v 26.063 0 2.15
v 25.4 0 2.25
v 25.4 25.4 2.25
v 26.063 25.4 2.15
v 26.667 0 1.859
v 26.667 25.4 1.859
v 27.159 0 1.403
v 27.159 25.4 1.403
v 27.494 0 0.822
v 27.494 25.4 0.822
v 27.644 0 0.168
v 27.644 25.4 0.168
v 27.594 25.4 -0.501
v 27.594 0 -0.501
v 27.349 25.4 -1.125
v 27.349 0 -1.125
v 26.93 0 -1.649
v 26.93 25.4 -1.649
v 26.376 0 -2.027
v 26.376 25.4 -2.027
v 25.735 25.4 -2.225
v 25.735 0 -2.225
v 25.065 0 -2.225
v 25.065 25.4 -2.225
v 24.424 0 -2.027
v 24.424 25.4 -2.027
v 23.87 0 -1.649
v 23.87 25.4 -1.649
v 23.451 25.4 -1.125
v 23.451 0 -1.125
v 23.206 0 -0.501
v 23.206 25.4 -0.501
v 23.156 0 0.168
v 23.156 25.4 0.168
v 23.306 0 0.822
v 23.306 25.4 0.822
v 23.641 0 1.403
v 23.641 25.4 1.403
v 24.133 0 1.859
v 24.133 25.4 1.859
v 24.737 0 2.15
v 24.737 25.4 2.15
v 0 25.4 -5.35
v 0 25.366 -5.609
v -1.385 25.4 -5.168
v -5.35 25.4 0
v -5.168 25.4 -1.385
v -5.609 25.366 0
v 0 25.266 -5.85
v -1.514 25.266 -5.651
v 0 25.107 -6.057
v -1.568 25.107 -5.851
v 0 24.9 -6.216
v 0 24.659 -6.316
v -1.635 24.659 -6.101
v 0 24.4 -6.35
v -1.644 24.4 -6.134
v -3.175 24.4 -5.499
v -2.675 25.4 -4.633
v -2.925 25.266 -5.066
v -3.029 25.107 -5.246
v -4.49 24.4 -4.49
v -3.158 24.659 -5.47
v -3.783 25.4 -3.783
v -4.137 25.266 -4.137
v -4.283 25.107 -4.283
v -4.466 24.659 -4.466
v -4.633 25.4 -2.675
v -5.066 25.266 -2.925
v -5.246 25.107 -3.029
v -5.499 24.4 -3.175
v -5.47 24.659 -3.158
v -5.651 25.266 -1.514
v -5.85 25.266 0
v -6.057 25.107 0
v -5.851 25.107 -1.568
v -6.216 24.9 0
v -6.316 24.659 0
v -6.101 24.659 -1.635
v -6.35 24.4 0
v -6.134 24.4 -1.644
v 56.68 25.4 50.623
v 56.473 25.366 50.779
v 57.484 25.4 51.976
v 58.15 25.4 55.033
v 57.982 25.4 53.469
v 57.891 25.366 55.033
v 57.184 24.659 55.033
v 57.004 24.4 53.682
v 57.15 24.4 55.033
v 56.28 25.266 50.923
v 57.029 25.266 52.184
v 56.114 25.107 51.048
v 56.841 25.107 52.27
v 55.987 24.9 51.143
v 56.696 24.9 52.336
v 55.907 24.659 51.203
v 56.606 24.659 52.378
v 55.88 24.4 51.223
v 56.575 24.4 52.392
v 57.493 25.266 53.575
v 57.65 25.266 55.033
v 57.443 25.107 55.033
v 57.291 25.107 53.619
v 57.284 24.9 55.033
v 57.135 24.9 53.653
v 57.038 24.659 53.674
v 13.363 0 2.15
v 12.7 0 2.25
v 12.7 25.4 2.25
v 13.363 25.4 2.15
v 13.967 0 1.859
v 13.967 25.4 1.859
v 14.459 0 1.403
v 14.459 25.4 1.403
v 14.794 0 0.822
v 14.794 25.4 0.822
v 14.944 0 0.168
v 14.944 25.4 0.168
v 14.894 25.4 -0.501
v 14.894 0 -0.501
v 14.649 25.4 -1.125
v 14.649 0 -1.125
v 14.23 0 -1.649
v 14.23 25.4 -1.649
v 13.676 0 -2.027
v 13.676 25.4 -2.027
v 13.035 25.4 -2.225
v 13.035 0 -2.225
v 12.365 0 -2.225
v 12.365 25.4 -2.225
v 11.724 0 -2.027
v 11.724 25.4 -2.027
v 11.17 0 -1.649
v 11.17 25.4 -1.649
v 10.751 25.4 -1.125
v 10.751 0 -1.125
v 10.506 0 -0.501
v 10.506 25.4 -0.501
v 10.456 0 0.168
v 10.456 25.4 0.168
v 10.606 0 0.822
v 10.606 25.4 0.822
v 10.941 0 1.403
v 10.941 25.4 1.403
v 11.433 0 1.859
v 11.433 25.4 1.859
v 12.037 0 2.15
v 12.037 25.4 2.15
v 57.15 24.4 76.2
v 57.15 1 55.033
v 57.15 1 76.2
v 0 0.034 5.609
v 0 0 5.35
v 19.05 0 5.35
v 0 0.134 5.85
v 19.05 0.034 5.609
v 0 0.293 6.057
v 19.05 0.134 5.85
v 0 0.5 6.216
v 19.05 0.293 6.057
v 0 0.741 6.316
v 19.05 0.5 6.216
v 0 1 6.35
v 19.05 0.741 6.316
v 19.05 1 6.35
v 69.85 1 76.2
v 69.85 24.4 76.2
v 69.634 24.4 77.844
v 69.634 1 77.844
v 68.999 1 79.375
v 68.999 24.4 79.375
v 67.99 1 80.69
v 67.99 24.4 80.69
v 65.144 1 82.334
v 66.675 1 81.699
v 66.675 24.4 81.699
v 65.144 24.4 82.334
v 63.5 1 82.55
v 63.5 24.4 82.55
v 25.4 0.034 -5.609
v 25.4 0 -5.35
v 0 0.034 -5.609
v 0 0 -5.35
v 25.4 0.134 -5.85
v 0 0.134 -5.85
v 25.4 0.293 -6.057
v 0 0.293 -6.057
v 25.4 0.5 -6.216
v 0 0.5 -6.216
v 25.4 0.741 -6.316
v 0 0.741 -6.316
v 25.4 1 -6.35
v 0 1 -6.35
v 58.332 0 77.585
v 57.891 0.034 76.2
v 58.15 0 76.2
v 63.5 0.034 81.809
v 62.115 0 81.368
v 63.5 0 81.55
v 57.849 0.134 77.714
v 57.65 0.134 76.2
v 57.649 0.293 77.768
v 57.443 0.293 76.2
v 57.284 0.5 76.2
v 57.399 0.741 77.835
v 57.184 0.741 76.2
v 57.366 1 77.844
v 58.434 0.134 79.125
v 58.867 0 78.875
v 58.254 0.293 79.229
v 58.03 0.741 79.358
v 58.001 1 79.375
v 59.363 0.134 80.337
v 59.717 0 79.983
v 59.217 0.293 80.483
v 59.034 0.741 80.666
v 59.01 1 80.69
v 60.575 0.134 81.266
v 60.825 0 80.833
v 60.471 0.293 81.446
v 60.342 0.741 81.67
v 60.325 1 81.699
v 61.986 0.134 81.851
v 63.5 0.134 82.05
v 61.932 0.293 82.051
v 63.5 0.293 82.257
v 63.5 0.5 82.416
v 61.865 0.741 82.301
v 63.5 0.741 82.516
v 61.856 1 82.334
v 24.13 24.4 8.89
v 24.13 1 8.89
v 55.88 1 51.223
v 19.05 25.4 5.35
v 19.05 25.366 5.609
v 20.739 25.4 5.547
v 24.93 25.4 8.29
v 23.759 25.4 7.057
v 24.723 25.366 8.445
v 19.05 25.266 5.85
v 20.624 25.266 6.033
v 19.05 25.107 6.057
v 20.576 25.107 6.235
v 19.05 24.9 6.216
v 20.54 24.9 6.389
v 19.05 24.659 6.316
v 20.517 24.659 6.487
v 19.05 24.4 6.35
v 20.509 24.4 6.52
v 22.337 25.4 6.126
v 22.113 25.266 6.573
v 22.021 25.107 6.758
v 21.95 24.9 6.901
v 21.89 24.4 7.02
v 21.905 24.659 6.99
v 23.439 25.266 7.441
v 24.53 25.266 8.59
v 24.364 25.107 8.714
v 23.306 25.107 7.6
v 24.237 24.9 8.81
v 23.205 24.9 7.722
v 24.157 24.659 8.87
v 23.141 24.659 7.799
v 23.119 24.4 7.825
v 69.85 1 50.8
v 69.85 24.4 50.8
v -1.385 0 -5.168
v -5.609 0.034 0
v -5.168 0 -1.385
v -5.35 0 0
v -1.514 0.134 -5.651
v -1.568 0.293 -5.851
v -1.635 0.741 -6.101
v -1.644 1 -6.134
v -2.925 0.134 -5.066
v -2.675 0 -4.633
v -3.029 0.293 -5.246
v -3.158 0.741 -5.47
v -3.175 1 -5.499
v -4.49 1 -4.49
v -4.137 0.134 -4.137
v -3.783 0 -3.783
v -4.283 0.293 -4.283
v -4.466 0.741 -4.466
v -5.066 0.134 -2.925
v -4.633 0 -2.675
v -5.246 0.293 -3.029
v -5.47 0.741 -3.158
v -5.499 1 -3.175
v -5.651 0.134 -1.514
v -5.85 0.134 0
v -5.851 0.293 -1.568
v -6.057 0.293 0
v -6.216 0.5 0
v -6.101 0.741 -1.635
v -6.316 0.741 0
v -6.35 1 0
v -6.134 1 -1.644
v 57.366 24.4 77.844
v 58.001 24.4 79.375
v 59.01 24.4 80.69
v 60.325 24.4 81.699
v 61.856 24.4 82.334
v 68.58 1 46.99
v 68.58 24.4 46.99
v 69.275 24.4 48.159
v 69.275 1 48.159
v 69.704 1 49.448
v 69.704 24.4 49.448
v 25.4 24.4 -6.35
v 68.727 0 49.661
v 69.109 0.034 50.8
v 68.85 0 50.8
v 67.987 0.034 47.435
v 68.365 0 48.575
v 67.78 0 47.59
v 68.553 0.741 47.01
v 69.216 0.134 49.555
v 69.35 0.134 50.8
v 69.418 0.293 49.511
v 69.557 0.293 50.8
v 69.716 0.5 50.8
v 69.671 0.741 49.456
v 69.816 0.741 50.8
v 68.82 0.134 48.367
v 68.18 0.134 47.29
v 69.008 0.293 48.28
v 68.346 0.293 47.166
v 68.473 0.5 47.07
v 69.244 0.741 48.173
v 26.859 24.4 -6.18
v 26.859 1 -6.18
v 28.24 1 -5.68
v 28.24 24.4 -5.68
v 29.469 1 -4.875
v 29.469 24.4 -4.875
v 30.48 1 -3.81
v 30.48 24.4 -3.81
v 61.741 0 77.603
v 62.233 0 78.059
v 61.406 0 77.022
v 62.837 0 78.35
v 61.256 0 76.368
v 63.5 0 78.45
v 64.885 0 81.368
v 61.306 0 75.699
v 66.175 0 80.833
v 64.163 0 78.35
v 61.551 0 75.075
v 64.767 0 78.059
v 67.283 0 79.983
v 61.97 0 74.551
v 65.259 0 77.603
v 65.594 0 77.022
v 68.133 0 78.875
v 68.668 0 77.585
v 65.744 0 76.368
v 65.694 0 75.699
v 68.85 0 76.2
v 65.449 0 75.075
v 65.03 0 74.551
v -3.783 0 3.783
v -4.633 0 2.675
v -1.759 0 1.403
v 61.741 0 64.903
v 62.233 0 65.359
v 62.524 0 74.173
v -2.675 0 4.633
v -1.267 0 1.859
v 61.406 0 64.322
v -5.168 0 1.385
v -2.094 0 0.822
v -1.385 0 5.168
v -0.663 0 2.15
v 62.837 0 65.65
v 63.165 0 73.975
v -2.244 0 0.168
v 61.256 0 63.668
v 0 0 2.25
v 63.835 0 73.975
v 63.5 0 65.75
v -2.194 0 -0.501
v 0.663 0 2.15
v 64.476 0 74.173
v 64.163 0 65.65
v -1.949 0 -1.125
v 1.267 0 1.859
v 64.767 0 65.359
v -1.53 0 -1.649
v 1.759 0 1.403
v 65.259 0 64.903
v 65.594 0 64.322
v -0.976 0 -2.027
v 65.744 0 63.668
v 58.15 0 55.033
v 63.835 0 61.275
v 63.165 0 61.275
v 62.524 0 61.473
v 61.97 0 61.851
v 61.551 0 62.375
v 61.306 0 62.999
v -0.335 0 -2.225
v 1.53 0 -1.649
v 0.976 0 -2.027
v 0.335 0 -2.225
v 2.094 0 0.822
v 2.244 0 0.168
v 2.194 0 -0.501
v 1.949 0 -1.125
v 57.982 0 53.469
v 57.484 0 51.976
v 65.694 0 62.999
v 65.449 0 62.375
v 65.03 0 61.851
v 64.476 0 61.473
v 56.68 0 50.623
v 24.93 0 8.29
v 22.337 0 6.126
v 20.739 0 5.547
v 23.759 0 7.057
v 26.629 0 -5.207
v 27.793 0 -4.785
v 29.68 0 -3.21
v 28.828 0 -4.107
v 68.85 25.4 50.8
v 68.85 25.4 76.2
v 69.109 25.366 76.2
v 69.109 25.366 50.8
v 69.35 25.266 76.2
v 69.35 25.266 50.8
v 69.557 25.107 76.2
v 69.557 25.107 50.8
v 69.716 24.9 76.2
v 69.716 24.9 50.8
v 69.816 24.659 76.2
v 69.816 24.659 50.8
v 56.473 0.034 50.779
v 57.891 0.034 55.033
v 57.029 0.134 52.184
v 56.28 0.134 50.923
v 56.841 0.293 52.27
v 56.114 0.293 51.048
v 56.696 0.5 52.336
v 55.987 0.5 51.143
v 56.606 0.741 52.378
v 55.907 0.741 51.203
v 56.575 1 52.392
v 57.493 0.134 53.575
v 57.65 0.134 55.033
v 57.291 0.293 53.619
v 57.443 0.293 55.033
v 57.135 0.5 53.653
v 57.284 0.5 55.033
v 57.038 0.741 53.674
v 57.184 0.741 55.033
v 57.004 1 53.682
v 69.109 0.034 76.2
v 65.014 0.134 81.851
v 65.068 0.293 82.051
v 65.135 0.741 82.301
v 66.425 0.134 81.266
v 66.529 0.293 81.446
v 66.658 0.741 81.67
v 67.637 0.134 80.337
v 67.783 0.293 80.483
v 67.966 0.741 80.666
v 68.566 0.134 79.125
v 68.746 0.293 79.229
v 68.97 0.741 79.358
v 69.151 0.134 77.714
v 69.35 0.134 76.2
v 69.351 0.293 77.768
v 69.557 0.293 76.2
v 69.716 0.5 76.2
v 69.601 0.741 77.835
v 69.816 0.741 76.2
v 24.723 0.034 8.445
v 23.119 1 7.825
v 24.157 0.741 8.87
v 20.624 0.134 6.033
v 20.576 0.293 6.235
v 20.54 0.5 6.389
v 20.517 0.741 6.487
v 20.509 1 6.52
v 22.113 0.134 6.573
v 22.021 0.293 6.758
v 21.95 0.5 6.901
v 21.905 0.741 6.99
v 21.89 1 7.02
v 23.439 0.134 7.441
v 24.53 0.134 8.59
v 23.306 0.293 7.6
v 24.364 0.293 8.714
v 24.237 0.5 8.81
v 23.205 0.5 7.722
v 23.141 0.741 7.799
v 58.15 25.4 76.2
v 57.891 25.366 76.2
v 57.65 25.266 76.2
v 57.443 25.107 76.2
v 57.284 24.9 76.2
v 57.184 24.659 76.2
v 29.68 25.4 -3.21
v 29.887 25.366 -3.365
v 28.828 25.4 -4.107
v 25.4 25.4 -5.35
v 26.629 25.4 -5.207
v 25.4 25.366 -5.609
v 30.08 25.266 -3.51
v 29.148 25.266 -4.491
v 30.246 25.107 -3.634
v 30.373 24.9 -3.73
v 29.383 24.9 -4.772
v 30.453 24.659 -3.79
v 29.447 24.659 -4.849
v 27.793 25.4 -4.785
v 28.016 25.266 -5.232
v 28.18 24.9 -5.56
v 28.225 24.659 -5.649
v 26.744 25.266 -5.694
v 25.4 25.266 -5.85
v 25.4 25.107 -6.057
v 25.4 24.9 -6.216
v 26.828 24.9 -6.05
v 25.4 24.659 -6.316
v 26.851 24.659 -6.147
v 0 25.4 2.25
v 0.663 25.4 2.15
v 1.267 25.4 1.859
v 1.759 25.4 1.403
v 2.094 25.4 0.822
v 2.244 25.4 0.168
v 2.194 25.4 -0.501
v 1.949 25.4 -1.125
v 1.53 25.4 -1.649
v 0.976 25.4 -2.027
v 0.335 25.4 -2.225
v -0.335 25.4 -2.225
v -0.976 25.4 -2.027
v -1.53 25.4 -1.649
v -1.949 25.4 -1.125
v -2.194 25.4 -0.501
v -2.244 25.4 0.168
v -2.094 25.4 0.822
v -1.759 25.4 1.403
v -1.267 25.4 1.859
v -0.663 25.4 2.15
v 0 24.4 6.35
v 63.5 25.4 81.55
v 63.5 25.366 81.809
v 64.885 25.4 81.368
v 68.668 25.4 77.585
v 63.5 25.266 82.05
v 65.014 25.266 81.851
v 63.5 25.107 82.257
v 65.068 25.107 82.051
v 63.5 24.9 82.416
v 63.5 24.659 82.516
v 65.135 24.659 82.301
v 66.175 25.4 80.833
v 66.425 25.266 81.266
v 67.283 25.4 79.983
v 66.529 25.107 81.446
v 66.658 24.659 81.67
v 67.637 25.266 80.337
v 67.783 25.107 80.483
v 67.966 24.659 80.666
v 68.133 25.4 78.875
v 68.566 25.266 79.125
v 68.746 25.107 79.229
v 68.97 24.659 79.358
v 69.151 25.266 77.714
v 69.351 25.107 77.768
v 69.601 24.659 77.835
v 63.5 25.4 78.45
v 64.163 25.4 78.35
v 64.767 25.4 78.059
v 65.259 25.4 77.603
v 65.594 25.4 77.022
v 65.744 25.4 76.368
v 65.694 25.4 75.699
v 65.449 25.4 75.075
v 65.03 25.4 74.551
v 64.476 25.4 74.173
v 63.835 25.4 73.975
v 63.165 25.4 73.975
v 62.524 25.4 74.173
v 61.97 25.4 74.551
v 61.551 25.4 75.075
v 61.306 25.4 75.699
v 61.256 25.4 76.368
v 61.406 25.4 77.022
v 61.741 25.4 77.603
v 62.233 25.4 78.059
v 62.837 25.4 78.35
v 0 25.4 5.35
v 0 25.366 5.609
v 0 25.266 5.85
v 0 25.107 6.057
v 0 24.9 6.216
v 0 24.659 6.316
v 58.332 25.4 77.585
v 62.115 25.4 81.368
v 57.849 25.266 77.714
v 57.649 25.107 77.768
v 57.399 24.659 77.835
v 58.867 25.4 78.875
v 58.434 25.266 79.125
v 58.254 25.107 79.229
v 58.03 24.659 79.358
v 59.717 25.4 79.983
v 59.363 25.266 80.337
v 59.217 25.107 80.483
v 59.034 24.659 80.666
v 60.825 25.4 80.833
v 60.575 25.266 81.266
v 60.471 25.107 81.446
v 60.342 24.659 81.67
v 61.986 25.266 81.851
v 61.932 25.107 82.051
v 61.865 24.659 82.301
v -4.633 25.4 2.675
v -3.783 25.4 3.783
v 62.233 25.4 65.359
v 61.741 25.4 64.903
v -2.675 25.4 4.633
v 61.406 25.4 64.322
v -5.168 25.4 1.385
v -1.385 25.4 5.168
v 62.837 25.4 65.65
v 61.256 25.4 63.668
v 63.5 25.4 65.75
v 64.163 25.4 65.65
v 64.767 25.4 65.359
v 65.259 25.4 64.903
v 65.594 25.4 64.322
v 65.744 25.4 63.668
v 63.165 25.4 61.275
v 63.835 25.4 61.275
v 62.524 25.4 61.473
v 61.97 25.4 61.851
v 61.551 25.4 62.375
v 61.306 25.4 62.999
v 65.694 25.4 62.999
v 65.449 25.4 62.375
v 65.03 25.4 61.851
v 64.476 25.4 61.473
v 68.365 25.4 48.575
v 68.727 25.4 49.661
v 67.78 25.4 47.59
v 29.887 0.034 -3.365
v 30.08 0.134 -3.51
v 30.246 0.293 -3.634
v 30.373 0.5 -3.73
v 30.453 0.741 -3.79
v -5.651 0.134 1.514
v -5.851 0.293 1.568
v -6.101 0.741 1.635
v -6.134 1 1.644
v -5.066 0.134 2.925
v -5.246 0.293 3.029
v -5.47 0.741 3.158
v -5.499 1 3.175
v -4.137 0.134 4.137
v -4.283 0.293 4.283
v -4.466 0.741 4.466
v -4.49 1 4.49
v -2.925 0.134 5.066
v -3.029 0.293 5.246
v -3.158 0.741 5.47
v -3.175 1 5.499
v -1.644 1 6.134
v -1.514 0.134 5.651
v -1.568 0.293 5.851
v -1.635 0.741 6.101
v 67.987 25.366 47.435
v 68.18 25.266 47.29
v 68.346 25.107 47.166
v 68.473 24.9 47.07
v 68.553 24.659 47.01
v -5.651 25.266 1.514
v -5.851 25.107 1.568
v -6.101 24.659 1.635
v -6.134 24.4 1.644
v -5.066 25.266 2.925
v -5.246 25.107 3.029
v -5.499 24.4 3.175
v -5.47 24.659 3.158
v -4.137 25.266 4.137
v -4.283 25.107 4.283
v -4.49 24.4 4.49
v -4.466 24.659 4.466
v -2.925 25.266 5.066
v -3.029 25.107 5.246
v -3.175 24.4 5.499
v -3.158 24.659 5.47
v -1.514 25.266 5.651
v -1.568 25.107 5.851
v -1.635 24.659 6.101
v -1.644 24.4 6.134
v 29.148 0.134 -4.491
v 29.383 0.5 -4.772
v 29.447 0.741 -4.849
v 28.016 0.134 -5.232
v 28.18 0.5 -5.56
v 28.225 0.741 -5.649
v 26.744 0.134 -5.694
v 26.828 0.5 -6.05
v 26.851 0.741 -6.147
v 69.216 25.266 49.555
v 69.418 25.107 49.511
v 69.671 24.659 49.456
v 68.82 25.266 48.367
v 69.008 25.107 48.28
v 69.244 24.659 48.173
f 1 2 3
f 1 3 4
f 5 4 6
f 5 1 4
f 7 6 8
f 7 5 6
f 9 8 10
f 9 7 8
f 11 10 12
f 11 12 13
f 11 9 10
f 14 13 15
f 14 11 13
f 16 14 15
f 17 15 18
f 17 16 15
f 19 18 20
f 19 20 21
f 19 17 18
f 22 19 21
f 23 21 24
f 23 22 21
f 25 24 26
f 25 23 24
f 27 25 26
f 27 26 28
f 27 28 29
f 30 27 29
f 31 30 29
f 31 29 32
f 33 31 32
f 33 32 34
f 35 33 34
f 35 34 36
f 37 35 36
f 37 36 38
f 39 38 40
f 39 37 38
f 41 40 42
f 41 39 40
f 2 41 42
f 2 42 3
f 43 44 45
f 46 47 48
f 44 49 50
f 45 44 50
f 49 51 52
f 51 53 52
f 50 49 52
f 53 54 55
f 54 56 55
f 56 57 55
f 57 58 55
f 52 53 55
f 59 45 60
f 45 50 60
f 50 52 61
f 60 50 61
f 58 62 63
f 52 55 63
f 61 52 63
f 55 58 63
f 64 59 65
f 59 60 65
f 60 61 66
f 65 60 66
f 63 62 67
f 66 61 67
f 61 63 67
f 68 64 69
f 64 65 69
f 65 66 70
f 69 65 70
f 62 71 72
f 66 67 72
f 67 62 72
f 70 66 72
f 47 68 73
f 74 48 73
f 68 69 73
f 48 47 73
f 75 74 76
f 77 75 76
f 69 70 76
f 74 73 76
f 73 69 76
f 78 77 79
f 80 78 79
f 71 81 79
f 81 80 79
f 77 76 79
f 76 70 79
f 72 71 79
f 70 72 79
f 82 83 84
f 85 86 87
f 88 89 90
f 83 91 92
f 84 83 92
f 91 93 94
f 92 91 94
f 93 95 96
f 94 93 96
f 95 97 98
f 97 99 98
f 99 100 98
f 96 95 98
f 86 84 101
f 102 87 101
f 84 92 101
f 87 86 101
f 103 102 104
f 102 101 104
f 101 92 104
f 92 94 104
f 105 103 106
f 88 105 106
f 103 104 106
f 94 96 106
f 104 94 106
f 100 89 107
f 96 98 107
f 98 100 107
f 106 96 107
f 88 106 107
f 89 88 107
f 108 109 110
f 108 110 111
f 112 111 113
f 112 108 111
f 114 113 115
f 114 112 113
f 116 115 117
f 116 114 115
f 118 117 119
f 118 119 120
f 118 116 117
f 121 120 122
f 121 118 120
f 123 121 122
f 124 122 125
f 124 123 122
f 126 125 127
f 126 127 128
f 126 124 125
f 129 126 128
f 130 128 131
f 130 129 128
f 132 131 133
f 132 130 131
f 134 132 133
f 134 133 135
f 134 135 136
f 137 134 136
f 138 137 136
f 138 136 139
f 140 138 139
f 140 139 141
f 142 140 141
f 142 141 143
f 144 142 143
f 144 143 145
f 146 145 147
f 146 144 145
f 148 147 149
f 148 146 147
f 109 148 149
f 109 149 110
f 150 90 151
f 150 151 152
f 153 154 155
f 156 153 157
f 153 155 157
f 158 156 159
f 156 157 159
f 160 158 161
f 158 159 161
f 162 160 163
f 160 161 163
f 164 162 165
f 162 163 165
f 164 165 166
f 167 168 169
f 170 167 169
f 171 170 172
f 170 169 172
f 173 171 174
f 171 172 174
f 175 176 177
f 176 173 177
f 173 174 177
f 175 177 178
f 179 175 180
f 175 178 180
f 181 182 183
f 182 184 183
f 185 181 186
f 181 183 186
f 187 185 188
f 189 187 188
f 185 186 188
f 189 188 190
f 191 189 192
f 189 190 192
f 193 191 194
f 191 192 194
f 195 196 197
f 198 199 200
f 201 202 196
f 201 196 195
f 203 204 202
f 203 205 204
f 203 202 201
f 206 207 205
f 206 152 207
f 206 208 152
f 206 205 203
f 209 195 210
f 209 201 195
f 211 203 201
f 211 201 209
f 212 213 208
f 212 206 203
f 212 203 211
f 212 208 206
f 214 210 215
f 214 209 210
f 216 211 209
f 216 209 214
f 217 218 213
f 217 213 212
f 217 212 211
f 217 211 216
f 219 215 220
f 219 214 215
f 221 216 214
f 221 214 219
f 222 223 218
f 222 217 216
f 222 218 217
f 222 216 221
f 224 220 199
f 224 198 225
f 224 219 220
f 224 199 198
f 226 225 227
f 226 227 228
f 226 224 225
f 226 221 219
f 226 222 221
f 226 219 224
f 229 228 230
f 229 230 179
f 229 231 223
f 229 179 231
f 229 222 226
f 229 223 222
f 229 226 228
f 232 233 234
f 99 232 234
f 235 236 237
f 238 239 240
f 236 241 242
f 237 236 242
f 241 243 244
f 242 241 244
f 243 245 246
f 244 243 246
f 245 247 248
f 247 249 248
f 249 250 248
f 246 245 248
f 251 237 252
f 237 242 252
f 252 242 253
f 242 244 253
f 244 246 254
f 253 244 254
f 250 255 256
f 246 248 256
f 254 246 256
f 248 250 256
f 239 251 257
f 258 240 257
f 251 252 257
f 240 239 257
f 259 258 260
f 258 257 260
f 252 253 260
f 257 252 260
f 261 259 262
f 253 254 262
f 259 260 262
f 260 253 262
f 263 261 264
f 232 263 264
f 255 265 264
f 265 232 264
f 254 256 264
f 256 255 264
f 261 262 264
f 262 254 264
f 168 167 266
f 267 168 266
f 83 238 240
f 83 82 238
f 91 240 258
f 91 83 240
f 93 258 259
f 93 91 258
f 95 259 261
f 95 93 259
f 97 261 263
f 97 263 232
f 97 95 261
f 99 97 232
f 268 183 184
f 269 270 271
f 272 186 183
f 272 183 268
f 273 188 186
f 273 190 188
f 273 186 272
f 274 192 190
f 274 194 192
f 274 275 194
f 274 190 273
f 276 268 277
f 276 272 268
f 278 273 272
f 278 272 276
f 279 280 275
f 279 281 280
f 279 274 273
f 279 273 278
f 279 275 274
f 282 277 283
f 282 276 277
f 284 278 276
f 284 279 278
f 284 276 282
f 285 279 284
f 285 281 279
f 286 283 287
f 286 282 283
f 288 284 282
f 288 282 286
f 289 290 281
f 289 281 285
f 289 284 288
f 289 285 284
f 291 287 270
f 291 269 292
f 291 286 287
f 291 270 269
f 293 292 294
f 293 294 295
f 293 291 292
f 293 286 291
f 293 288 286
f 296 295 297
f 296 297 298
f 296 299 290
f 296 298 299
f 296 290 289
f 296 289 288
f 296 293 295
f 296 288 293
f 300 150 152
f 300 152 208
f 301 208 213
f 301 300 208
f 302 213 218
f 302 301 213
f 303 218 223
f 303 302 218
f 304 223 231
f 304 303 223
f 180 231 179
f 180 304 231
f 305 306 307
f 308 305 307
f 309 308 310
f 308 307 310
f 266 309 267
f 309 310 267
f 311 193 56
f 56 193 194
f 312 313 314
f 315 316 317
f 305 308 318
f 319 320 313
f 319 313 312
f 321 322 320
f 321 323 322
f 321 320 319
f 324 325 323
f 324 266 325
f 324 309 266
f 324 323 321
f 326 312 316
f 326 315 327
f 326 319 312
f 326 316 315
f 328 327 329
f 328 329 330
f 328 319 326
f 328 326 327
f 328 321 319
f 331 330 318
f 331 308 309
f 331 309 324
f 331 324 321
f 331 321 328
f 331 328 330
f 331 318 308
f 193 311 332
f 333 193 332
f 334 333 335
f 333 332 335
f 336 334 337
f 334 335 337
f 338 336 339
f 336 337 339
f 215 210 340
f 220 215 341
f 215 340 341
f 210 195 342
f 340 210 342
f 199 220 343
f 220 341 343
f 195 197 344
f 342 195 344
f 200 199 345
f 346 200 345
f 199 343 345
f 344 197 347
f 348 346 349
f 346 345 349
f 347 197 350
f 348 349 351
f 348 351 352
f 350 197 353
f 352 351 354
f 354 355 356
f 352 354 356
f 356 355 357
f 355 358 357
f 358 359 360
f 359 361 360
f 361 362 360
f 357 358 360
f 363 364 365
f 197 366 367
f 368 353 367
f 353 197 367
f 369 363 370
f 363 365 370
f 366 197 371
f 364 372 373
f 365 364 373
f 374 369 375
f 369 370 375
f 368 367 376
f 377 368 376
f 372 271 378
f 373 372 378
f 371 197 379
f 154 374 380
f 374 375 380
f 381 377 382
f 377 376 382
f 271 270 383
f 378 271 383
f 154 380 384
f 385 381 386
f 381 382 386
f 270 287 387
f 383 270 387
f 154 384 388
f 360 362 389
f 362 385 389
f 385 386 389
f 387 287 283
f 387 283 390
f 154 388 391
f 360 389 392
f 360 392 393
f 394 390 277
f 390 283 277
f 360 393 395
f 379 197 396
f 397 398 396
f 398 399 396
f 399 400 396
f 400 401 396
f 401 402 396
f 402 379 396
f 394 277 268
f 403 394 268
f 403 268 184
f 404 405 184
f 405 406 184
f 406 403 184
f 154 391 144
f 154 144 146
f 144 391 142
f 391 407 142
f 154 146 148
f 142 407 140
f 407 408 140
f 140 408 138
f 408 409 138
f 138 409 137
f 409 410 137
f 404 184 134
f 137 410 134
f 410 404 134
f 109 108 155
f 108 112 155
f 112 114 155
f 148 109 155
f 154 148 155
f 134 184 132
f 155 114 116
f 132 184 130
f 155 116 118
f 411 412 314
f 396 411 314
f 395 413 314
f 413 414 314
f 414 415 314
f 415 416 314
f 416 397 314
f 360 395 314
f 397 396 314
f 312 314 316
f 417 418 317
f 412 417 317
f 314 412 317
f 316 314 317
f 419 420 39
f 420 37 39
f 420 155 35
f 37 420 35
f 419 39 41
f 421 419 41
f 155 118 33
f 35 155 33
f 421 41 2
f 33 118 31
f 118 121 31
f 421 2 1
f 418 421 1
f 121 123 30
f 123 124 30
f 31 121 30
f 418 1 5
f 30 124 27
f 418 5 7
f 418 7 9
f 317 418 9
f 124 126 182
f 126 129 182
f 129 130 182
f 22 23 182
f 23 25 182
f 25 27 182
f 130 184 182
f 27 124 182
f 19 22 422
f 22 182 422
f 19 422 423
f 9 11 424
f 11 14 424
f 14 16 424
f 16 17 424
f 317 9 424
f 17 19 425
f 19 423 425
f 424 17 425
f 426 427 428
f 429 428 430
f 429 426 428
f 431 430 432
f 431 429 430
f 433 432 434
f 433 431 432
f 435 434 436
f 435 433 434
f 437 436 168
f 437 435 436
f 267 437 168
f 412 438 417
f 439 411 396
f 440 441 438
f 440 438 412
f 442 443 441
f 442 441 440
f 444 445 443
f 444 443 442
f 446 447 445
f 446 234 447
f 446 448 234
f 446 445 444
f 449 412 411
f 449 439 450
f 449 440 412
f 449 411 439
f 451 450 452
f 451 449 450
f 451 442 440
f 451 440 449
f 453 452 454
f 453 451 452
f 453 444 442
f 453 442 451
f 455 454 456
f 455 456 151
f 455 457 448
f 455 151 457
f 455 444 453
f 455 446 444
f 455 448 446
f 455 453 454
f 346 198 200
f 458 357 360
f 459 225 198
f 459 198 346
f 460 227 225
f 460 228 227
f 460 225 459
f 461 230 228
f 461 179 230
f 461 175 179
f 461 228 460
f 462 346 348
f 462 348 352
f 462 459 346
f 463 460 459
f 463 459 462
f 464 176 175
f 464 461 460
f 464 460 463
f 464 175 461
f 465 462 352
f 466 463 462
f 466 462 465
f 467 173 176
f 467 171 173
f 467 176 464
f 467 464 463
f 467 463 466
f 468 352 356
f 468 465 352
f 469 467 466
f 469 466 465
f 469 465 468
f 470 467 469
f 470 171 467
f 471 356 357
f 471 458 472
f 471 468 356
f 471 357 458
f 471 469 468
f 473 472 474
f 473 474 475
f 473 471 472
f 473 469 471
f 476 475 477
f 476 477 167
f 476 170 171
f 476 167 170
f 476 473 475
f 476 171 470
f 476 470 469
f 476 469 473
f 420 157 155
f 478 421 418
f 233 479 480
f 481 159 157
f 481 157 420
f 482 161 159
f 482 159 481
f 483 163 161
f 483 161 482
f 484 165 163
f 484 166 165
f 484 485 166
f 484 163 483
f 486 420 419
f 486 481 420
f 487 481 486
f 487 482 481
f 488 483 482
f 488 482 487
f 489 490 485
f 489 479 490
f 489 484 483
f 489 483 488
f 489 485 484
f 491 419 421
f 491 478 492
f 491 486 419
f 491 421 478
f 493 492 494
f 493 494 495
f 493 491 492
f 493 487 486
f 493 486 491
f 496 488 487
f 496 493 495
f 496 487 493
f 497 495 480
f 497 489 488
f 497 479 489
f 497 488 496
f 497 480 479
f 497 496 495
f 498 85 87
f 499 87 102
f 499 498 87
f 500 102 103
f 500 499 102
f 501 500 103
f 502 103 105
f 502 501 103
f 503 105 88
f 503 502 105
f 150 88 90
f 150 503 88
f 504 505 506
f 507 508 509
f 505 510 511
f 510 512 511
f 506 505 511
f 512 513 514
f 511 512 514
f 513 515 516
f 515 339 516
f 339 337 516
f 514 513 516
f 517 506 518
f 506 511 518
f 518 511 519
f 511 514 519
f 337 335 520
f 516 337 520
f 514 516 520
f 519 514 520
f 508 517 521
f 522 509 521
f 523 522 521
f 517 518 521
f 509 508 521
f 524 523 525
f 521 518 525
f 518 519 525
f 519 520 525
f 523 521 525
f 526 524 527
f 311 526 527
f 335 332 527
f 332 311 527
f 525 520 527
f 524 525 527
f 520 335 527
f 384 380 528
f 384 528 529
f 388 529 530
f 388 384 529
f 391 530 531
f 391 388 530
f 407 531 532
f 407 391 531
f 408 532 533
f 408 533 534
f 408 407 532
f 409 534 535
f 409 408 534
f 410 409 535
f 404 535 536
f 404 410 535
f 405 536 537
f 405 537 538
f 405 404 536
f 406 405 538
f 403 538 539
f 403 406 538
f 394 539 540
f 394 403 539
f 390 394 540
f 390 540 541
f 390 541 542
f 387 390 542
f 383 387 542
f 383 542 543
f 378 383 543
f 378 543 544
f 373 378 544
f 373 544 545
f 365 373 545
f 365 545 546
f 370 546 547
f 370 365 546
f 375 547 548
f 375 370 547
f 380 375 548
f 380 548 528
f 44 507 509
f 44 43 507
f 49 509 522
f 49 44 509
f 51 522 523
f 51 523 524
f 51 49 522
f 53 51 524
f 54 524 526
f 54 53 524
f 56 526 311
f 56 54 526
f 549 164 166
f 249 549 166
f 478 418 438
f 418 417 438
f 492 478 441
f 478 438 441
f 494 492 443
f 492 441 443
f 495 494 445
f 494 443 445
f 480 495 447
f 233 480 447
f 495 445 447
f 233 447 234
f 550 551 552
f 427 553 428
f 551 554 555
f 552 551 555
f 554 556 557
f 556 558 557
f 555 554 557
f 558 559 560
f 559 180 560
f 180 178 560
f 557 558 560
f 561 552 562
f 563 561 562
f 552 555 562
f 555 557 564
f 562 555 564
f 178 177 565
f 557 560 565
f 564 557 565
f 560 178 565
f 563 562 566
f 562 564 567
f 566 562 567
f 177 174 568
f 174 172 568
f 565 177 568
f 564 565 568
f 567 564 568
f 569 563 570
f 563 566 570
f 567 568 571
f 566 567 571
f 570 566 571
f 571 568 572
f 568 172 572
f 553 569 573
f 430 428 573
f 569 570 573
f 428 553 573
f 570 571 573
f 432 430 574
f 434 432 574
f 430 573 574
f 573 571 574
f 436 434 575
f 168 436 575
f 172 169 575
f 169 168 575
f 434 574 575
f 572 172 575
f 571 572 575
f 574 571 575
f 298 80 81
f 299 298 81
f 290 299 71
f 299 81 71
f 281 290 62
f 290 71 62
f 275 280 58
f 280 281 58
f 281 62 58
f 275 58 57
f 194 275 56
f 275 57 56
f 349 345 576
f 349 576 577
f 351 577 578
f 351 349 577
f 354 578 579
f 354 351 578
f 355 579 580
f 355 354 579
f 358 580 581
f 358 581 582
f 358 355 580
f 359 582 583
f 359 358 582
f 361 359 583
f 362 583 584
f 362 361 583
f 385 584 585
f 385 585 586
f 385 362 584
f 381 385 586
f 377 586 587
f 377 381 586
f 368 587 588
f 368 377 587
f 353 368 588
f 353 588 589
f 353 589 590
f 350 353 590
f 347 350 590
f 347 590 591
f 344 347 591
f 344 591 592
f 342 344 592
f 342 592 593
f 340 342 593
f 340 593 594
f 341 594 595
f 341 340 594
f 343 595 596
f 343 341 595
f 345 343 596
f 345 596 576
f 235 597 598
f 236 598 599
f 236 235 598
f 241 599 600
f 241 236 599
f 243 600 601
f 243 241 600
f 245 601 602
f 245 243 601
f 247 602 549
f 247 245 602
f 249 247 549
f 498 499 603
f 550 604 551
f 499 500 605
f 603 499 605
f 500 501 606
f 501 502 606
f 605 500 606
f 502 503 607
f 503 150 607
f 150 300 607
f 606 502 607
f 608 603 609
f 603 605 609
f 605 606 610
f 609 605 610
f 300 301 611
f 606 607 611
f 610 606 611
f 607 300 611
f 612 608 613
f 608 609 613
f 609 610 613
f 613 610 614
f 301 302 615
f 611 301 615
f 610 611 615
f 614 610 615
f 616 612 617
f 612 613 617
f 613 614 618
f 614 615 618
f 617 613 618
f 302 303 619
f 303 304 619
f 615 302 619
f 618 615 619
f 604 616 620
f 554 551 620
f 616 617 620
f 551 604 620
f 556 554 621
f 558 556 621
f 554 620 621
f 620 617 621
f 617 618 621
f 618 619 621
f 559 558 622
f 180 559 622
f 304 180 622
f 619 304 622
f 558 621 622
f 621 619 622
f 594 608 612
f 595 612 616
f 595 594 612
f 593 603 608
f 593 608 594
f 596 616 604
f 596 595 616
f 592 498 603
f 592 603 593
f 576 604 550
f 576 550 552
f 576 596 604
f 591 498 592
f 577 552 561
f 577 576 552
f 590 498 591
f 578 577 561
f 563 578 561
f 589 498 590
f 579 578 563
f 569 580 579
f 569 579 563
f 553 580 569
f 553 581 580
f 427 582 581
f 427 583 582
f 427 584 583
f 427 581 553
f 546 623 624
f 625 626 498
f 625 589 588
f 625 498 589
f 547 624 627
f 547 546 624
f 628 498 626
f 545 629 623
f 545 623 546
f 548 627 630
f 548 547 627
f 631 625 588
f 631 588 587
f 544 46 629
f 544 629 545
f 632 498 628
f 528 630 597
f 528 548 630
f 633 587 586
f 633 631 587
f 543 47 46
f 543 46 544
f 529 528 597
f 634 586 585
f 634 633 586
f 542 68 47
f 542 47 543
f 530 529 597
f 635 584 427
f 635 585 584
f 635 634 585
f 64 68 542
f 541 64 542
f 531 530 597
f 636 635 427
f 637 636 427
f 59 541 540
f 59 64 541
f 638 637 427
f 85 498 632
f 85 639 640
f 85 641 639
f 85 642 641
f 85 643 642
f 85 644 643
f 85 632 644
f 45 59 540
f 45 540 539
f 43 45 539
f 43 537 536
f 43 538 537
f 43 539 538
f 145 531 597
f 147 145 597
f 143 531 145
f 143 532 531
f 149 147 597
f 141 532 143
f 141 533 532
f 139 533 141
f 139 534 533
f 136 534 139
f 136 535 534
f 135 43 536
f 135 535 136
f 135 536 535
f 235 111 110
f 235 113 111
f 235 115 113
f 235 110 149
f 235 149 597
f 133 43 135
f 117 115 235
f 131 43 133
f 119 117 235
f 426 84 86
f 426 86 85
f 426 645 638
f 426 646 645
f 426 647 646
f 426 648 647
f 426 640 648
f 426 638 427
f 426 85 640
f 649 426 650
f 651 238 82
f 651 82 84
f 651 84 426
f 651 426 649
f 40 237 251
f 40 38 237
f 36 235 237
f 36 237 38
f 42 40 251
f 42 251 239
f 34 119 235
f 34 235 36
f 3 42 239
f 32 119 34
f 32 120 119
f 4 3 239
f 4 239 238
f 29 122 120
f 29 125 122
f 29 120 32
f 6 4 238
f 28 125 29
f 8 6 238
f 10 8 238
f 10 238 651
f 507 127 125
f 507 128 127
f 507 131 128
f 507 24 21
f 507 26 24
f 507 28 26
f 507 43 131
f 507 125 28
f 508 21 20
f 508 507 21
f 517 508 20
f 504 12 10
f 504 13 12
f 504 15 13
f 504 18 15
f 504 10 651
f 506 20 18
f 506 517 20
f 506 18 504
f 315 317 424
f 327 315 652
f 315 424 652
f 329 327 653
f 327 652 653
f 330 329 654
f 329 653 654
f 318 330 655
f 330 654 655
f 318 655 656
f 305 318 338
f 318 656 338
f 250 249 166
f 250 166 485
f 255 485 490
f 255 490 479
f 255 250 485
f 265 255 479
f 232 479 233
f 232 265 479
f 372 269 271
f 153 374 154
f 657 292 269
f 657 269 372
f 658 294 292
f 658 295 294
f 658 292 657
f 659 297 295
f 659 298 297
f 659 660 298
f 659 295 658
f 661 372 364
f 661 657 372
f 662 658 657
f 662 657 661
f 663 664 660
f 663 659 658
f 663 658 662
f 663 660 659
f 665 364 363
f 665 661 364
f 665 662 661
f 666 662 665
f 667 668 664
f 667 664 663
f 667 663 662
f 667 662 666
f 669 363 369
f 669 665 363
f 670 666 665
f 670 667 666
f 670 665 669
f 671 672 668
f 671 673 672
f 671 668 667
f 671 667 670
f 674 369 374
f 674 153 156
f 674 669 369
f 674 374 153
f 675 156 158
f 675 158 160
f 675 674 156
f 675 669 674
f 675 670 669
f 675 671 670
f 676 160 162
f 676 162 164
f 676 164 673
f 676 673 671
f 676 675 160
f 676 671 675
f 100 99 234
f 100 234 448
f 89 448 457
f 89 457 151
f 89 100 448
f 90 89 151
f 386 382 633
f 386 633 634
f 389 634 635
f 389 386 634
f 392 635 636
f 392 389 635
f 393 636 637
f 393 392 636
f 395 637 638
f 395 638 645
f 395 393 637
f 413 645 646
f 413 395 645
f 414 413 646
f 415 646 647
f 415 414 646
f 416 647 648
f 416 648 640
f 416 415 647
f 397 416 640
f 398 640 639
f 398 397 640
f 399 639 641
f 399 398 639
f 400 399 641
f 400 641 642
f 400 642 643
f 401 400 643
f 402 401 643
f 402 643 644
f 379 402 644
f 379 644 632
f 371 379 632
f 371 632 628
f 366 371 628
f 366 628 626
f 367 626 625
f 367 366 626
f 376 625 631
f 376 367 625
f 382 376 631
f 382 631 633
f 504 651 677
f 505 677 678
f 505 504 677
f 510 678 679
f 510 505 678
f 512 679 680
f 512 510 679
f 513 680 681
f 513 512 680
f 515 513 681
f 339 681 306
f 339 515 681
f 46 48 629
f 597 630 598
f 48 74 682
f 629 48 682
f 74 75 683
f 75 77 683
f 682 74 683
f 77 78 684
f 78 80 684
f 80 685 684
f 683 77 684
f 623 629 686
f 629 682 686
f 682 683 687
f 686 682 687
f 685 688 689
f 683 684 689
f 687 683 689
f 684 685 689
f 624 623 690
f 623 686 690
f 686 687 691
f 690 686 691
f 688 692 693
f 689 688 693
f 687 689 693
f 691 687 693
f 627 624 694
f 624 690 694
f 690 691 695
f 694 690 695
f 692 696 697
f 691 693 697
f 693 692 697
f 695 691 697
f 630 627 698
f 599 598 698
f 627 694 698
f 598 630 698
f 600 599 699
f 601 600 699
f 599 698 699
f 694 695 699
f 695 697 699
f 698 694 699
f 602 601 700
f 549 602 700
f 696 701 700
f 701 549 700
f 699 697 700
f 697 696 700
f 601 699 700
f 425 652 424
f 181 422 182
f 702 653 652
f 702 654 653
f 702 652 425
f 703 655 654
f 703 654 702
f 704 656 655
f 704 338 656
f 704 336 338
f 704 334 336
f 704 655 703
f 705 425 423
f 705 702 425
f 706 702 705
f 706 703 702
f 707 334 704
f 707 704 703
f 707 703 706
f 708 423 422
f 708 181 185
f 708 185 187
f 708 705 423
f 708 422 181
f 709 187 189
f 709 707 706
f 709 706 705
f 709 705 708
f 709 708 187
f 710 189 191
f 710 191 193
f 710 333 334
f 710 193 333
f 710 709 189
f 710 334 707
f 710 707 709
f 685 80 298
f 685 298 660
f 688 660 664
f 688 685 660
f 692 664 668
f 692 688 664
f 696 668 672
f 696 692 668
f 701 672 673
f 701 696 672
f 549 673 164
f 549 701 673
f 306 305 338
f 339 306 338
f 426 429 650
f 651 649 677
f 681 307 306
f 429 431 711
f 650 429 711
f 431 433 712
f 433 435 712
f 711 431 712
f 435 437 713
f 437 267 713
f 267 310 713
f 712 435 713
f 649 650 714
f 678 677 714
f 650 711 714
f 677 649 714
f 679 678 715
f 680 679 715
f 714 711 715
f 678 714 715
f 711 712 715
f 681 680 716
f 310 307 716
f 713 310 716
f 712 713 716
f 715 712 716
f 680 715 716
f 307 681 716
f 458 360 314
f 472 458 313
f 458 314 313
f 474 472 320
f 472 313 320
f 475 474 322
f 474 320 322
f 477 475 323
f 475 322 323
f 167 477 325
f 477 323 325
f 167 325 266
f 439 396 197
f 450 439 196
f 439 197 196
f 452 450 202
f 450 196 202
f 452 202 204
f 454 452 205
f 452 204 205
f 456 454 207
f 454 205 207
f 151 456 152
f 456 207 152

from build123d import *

# Parameters (mm, degrees)
SKETCH1_R           = 2.25
BOSS_EXTRUDE1_DEPTH = 25.4
FILLET1_R           = 6.35
FILLET2_R           = 1


with BuildPart() as part:
    # Sketch1 → Boss-Extrude1 (new body)
    with BuildSketch(Plane(origin=(0, 0, 0), x_dir=(1, 0, 0), z_dir=(0, 1, 0))):
        Polygon((-6.35, 6.35), (-6.35, -6.35), (22.225, -6.35), (57.15, -52.916666667), (57.15, -82.55), (69.85, -82.55), (69.85, -48.683333333), (28.575, 6.35), align=None)
        with Locations(Location((0, 0, 0), (0, 0, 270))):
            Circle(SKETCH1_R, mode=Mode.SUBTRACT)
        with Locations(Location((63.5, -76.2, 0), (0, 0, 270))):
            Circle(SKETCH1_R, mode=Mode.SUBTRACT)
        with Locations(Location((63.5, -63.5, 0), (0, 0, 270))):
            Circle(SKETCH1_R, mode=Mode.SUBTRACT)
        with Locations(Location((12.7, 0, 0), (0, 0, 270))):
            Circle(SKETCH1_R, mode=Mode.SUBTRACT)
        with Locations(Location((25.4, 0, 0), (0, 0, 270))):
            Circle(SKETCH1_R, mode=Mode.SUBTRACT)
    extrude(amount=BOSS_EXTRUDE1_DEPTH)

    # Fillet1
    fillet1_edges = [part.edges().sort_by_distance(p)[0] for p in [
        (28.575, 12.7, -6.35),
        (22.225, 12.7, 6.35),
        (69.85, 12.7, 48.683333333),
        (57.15, 12.7, 52.916666667),
        (69.85, 12.7, 82.55),
        (57.15, 12.7, 82.55),
        (-6.35, 12.7, -6.35),
        (-6.35, 12.7, 6.35),
    ]]
    fillet(fillet1_edges, radius=FILLET1_R - 0.0001)  # a hair under: the kernel refuses the full size

    # Fillet2
    fillet2_edges = [part.edges().sort_by_distance(p)[0] for p in [
        (12.699975, 0, -6.35),
        (12.699975, 25.4, -6.35),
        (49.529995, 0, 21.589993333),
        (69.85, 0, 63.500033333),
        (57.15, 0, 65.6167),
        (40.004995, 0, 30.05666),
        (9.524975, 0, 6.35),
        (-4.49015735, 0, 4.49015735),
        (-4.49015735, 0, -4.49015735),
        (59.00984265, 0, 80.69015735),
        (67.99015735, 0, 80.69015735),
        (69.524144074, 0, 48.791951975),
        (28.23981161, 0, -5.67962322),
        (49.529995, 25.4, 21.589993333),
        (9.524975, 25.4, 6.35),
        (40.004995, 25.4, 30.05666),
        (57.15, 25.4, 65.6167),
        (69.85, 25.4, 63.500033333),
        (-4.49015735, 25.4, 4.49015735),
        (-4.49015735, 25.4, -4.49015735),
        (59.00984265, 25.4, 80.69015735),
        (67.99015735, 25.4, 80.69015735),
        (69.524144074, 25.4, 48.791951975),
        (28.23981161, 25.4, -5.67962322),
        (21.88981161, 0, 7.02037678),
        (21.88981161, 25.4, 7.02037678),
        (56.824144074, 0, 53.025285309),
        (56.824144074, 25.4, 53.025285309),
    ]]
    fillet(fillet2_edges, radius=FILLET2_R)


solid = part.part
